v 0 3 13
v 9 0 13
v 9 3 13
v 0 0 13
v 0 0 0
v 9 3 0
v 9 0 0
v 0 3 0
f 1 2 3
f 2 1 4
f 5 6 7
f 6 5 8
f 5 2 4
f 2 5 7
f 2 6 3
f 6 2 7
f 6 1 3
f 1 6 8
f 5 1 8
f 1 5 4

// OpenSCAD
// Generated by SolidPython 1.0.1 on 2020-07-29 00:46:55


cube(size = [9, 3, 13]);
/***********************************************
*********      SolidPython code:      **********
************************************************
 
# import packages: SolidPython
from solid import *
from solid.utils import *
from itertools import chain, combinations, permutations


class Resize:

    def __init__(self, scad_file):
        self.scad_file = scad_file
        #self.scad_file = import_scad(scad_file)
        # cone/cylinder param:
        self.r1 = 0
        self.r2 = 0
        self.h = 0
        # rectangular prism param:
        self.w = 0
        self.l = 0
        # ellipse param:
        self.r = 0

    # import OpenScad code (file name corresponds to shape)


    # classify shape + parameters
    def assign(self, param1, param2, param3):
        if self.scad_file == 'cone.scad':
            self.r1 = param1
            self.r2 = param2
            self.h = param3
        elif self.scad_file == 'cylinder.scad':
            self.r1 = param1
            self.r2 = param2
            self.h = param3
        elif self.scad_file == 'rectangularPrism.scad':
            self.h = param1
            self.l = param2
            self.w = param3
        else:
            self.r = param1
            self.h = param2

    # resize parameters
    def iterate(self):
        x = range(3, 20, 2)
        i = 1
        if self.scad_file == 'cone.scad':
            tempList = list(permutations(x, 2))
            for temp in tempList:
                param1 = temp[0]
                param2 = temp[1]
                filepath = 'produced_scad_files/' + 'cone' + str(param1) + '_' + str(param2) + '_' + '.scad'
                scad_render_to_file(cylinder(h=param1, r1=param2, r2=0), filepath)

        elif self.scad_file == 'cylinder.scad':
            tempList = list(permutations(x, 3))
            for temp in tempList:
                param1 = temp[0]
                param2 = temp[1]
                filepath = 'produced_scad_files/' + 'cylinder' + str(param1) + '_' + str(param2) + '_' + '.scad'
                scad_render_to_file(cylinder(h=param1, r1=param2, r2=param2), filepath)

        elif self.scad_file == 'rectangularPrism.scad':
            tempList = list(permutations(x, 3))
            for temp in tempList:
                param1 = temp[0]
                param2 = temp[1]
                param3 = temp[2]
                filepath = 'produced_scad_files/' + 'rectangularPrism' + str(param1) + '_' + str(param2) + '_' + str(
                    param3) + '.scad'
                scad_render_to_file(cube(size=(param1, param2, param3)), filepath)

        elif self.scad_file == 'ellipse.scad':
            tempList = list(permutations(x, 4))
            for temp in tempList:
                param1 = temp[0]
                param2 = temp[1]
                param3 = temp[2]
                param4 = temp[3]
                filepath = 'produced_scad_files/' + 'ellipse' + str(param1) + '_' + str(param2) + '_' + str(param3) + '_' + str(param4) + '.scad'
                scad_render_to_file(scale([param1, param2, param3])(sphere(r=param4)), filepath)

    def render_to_scadfile(self):
        scad_render_to_file(scad, 'example.scad') 
 
************************************************/
